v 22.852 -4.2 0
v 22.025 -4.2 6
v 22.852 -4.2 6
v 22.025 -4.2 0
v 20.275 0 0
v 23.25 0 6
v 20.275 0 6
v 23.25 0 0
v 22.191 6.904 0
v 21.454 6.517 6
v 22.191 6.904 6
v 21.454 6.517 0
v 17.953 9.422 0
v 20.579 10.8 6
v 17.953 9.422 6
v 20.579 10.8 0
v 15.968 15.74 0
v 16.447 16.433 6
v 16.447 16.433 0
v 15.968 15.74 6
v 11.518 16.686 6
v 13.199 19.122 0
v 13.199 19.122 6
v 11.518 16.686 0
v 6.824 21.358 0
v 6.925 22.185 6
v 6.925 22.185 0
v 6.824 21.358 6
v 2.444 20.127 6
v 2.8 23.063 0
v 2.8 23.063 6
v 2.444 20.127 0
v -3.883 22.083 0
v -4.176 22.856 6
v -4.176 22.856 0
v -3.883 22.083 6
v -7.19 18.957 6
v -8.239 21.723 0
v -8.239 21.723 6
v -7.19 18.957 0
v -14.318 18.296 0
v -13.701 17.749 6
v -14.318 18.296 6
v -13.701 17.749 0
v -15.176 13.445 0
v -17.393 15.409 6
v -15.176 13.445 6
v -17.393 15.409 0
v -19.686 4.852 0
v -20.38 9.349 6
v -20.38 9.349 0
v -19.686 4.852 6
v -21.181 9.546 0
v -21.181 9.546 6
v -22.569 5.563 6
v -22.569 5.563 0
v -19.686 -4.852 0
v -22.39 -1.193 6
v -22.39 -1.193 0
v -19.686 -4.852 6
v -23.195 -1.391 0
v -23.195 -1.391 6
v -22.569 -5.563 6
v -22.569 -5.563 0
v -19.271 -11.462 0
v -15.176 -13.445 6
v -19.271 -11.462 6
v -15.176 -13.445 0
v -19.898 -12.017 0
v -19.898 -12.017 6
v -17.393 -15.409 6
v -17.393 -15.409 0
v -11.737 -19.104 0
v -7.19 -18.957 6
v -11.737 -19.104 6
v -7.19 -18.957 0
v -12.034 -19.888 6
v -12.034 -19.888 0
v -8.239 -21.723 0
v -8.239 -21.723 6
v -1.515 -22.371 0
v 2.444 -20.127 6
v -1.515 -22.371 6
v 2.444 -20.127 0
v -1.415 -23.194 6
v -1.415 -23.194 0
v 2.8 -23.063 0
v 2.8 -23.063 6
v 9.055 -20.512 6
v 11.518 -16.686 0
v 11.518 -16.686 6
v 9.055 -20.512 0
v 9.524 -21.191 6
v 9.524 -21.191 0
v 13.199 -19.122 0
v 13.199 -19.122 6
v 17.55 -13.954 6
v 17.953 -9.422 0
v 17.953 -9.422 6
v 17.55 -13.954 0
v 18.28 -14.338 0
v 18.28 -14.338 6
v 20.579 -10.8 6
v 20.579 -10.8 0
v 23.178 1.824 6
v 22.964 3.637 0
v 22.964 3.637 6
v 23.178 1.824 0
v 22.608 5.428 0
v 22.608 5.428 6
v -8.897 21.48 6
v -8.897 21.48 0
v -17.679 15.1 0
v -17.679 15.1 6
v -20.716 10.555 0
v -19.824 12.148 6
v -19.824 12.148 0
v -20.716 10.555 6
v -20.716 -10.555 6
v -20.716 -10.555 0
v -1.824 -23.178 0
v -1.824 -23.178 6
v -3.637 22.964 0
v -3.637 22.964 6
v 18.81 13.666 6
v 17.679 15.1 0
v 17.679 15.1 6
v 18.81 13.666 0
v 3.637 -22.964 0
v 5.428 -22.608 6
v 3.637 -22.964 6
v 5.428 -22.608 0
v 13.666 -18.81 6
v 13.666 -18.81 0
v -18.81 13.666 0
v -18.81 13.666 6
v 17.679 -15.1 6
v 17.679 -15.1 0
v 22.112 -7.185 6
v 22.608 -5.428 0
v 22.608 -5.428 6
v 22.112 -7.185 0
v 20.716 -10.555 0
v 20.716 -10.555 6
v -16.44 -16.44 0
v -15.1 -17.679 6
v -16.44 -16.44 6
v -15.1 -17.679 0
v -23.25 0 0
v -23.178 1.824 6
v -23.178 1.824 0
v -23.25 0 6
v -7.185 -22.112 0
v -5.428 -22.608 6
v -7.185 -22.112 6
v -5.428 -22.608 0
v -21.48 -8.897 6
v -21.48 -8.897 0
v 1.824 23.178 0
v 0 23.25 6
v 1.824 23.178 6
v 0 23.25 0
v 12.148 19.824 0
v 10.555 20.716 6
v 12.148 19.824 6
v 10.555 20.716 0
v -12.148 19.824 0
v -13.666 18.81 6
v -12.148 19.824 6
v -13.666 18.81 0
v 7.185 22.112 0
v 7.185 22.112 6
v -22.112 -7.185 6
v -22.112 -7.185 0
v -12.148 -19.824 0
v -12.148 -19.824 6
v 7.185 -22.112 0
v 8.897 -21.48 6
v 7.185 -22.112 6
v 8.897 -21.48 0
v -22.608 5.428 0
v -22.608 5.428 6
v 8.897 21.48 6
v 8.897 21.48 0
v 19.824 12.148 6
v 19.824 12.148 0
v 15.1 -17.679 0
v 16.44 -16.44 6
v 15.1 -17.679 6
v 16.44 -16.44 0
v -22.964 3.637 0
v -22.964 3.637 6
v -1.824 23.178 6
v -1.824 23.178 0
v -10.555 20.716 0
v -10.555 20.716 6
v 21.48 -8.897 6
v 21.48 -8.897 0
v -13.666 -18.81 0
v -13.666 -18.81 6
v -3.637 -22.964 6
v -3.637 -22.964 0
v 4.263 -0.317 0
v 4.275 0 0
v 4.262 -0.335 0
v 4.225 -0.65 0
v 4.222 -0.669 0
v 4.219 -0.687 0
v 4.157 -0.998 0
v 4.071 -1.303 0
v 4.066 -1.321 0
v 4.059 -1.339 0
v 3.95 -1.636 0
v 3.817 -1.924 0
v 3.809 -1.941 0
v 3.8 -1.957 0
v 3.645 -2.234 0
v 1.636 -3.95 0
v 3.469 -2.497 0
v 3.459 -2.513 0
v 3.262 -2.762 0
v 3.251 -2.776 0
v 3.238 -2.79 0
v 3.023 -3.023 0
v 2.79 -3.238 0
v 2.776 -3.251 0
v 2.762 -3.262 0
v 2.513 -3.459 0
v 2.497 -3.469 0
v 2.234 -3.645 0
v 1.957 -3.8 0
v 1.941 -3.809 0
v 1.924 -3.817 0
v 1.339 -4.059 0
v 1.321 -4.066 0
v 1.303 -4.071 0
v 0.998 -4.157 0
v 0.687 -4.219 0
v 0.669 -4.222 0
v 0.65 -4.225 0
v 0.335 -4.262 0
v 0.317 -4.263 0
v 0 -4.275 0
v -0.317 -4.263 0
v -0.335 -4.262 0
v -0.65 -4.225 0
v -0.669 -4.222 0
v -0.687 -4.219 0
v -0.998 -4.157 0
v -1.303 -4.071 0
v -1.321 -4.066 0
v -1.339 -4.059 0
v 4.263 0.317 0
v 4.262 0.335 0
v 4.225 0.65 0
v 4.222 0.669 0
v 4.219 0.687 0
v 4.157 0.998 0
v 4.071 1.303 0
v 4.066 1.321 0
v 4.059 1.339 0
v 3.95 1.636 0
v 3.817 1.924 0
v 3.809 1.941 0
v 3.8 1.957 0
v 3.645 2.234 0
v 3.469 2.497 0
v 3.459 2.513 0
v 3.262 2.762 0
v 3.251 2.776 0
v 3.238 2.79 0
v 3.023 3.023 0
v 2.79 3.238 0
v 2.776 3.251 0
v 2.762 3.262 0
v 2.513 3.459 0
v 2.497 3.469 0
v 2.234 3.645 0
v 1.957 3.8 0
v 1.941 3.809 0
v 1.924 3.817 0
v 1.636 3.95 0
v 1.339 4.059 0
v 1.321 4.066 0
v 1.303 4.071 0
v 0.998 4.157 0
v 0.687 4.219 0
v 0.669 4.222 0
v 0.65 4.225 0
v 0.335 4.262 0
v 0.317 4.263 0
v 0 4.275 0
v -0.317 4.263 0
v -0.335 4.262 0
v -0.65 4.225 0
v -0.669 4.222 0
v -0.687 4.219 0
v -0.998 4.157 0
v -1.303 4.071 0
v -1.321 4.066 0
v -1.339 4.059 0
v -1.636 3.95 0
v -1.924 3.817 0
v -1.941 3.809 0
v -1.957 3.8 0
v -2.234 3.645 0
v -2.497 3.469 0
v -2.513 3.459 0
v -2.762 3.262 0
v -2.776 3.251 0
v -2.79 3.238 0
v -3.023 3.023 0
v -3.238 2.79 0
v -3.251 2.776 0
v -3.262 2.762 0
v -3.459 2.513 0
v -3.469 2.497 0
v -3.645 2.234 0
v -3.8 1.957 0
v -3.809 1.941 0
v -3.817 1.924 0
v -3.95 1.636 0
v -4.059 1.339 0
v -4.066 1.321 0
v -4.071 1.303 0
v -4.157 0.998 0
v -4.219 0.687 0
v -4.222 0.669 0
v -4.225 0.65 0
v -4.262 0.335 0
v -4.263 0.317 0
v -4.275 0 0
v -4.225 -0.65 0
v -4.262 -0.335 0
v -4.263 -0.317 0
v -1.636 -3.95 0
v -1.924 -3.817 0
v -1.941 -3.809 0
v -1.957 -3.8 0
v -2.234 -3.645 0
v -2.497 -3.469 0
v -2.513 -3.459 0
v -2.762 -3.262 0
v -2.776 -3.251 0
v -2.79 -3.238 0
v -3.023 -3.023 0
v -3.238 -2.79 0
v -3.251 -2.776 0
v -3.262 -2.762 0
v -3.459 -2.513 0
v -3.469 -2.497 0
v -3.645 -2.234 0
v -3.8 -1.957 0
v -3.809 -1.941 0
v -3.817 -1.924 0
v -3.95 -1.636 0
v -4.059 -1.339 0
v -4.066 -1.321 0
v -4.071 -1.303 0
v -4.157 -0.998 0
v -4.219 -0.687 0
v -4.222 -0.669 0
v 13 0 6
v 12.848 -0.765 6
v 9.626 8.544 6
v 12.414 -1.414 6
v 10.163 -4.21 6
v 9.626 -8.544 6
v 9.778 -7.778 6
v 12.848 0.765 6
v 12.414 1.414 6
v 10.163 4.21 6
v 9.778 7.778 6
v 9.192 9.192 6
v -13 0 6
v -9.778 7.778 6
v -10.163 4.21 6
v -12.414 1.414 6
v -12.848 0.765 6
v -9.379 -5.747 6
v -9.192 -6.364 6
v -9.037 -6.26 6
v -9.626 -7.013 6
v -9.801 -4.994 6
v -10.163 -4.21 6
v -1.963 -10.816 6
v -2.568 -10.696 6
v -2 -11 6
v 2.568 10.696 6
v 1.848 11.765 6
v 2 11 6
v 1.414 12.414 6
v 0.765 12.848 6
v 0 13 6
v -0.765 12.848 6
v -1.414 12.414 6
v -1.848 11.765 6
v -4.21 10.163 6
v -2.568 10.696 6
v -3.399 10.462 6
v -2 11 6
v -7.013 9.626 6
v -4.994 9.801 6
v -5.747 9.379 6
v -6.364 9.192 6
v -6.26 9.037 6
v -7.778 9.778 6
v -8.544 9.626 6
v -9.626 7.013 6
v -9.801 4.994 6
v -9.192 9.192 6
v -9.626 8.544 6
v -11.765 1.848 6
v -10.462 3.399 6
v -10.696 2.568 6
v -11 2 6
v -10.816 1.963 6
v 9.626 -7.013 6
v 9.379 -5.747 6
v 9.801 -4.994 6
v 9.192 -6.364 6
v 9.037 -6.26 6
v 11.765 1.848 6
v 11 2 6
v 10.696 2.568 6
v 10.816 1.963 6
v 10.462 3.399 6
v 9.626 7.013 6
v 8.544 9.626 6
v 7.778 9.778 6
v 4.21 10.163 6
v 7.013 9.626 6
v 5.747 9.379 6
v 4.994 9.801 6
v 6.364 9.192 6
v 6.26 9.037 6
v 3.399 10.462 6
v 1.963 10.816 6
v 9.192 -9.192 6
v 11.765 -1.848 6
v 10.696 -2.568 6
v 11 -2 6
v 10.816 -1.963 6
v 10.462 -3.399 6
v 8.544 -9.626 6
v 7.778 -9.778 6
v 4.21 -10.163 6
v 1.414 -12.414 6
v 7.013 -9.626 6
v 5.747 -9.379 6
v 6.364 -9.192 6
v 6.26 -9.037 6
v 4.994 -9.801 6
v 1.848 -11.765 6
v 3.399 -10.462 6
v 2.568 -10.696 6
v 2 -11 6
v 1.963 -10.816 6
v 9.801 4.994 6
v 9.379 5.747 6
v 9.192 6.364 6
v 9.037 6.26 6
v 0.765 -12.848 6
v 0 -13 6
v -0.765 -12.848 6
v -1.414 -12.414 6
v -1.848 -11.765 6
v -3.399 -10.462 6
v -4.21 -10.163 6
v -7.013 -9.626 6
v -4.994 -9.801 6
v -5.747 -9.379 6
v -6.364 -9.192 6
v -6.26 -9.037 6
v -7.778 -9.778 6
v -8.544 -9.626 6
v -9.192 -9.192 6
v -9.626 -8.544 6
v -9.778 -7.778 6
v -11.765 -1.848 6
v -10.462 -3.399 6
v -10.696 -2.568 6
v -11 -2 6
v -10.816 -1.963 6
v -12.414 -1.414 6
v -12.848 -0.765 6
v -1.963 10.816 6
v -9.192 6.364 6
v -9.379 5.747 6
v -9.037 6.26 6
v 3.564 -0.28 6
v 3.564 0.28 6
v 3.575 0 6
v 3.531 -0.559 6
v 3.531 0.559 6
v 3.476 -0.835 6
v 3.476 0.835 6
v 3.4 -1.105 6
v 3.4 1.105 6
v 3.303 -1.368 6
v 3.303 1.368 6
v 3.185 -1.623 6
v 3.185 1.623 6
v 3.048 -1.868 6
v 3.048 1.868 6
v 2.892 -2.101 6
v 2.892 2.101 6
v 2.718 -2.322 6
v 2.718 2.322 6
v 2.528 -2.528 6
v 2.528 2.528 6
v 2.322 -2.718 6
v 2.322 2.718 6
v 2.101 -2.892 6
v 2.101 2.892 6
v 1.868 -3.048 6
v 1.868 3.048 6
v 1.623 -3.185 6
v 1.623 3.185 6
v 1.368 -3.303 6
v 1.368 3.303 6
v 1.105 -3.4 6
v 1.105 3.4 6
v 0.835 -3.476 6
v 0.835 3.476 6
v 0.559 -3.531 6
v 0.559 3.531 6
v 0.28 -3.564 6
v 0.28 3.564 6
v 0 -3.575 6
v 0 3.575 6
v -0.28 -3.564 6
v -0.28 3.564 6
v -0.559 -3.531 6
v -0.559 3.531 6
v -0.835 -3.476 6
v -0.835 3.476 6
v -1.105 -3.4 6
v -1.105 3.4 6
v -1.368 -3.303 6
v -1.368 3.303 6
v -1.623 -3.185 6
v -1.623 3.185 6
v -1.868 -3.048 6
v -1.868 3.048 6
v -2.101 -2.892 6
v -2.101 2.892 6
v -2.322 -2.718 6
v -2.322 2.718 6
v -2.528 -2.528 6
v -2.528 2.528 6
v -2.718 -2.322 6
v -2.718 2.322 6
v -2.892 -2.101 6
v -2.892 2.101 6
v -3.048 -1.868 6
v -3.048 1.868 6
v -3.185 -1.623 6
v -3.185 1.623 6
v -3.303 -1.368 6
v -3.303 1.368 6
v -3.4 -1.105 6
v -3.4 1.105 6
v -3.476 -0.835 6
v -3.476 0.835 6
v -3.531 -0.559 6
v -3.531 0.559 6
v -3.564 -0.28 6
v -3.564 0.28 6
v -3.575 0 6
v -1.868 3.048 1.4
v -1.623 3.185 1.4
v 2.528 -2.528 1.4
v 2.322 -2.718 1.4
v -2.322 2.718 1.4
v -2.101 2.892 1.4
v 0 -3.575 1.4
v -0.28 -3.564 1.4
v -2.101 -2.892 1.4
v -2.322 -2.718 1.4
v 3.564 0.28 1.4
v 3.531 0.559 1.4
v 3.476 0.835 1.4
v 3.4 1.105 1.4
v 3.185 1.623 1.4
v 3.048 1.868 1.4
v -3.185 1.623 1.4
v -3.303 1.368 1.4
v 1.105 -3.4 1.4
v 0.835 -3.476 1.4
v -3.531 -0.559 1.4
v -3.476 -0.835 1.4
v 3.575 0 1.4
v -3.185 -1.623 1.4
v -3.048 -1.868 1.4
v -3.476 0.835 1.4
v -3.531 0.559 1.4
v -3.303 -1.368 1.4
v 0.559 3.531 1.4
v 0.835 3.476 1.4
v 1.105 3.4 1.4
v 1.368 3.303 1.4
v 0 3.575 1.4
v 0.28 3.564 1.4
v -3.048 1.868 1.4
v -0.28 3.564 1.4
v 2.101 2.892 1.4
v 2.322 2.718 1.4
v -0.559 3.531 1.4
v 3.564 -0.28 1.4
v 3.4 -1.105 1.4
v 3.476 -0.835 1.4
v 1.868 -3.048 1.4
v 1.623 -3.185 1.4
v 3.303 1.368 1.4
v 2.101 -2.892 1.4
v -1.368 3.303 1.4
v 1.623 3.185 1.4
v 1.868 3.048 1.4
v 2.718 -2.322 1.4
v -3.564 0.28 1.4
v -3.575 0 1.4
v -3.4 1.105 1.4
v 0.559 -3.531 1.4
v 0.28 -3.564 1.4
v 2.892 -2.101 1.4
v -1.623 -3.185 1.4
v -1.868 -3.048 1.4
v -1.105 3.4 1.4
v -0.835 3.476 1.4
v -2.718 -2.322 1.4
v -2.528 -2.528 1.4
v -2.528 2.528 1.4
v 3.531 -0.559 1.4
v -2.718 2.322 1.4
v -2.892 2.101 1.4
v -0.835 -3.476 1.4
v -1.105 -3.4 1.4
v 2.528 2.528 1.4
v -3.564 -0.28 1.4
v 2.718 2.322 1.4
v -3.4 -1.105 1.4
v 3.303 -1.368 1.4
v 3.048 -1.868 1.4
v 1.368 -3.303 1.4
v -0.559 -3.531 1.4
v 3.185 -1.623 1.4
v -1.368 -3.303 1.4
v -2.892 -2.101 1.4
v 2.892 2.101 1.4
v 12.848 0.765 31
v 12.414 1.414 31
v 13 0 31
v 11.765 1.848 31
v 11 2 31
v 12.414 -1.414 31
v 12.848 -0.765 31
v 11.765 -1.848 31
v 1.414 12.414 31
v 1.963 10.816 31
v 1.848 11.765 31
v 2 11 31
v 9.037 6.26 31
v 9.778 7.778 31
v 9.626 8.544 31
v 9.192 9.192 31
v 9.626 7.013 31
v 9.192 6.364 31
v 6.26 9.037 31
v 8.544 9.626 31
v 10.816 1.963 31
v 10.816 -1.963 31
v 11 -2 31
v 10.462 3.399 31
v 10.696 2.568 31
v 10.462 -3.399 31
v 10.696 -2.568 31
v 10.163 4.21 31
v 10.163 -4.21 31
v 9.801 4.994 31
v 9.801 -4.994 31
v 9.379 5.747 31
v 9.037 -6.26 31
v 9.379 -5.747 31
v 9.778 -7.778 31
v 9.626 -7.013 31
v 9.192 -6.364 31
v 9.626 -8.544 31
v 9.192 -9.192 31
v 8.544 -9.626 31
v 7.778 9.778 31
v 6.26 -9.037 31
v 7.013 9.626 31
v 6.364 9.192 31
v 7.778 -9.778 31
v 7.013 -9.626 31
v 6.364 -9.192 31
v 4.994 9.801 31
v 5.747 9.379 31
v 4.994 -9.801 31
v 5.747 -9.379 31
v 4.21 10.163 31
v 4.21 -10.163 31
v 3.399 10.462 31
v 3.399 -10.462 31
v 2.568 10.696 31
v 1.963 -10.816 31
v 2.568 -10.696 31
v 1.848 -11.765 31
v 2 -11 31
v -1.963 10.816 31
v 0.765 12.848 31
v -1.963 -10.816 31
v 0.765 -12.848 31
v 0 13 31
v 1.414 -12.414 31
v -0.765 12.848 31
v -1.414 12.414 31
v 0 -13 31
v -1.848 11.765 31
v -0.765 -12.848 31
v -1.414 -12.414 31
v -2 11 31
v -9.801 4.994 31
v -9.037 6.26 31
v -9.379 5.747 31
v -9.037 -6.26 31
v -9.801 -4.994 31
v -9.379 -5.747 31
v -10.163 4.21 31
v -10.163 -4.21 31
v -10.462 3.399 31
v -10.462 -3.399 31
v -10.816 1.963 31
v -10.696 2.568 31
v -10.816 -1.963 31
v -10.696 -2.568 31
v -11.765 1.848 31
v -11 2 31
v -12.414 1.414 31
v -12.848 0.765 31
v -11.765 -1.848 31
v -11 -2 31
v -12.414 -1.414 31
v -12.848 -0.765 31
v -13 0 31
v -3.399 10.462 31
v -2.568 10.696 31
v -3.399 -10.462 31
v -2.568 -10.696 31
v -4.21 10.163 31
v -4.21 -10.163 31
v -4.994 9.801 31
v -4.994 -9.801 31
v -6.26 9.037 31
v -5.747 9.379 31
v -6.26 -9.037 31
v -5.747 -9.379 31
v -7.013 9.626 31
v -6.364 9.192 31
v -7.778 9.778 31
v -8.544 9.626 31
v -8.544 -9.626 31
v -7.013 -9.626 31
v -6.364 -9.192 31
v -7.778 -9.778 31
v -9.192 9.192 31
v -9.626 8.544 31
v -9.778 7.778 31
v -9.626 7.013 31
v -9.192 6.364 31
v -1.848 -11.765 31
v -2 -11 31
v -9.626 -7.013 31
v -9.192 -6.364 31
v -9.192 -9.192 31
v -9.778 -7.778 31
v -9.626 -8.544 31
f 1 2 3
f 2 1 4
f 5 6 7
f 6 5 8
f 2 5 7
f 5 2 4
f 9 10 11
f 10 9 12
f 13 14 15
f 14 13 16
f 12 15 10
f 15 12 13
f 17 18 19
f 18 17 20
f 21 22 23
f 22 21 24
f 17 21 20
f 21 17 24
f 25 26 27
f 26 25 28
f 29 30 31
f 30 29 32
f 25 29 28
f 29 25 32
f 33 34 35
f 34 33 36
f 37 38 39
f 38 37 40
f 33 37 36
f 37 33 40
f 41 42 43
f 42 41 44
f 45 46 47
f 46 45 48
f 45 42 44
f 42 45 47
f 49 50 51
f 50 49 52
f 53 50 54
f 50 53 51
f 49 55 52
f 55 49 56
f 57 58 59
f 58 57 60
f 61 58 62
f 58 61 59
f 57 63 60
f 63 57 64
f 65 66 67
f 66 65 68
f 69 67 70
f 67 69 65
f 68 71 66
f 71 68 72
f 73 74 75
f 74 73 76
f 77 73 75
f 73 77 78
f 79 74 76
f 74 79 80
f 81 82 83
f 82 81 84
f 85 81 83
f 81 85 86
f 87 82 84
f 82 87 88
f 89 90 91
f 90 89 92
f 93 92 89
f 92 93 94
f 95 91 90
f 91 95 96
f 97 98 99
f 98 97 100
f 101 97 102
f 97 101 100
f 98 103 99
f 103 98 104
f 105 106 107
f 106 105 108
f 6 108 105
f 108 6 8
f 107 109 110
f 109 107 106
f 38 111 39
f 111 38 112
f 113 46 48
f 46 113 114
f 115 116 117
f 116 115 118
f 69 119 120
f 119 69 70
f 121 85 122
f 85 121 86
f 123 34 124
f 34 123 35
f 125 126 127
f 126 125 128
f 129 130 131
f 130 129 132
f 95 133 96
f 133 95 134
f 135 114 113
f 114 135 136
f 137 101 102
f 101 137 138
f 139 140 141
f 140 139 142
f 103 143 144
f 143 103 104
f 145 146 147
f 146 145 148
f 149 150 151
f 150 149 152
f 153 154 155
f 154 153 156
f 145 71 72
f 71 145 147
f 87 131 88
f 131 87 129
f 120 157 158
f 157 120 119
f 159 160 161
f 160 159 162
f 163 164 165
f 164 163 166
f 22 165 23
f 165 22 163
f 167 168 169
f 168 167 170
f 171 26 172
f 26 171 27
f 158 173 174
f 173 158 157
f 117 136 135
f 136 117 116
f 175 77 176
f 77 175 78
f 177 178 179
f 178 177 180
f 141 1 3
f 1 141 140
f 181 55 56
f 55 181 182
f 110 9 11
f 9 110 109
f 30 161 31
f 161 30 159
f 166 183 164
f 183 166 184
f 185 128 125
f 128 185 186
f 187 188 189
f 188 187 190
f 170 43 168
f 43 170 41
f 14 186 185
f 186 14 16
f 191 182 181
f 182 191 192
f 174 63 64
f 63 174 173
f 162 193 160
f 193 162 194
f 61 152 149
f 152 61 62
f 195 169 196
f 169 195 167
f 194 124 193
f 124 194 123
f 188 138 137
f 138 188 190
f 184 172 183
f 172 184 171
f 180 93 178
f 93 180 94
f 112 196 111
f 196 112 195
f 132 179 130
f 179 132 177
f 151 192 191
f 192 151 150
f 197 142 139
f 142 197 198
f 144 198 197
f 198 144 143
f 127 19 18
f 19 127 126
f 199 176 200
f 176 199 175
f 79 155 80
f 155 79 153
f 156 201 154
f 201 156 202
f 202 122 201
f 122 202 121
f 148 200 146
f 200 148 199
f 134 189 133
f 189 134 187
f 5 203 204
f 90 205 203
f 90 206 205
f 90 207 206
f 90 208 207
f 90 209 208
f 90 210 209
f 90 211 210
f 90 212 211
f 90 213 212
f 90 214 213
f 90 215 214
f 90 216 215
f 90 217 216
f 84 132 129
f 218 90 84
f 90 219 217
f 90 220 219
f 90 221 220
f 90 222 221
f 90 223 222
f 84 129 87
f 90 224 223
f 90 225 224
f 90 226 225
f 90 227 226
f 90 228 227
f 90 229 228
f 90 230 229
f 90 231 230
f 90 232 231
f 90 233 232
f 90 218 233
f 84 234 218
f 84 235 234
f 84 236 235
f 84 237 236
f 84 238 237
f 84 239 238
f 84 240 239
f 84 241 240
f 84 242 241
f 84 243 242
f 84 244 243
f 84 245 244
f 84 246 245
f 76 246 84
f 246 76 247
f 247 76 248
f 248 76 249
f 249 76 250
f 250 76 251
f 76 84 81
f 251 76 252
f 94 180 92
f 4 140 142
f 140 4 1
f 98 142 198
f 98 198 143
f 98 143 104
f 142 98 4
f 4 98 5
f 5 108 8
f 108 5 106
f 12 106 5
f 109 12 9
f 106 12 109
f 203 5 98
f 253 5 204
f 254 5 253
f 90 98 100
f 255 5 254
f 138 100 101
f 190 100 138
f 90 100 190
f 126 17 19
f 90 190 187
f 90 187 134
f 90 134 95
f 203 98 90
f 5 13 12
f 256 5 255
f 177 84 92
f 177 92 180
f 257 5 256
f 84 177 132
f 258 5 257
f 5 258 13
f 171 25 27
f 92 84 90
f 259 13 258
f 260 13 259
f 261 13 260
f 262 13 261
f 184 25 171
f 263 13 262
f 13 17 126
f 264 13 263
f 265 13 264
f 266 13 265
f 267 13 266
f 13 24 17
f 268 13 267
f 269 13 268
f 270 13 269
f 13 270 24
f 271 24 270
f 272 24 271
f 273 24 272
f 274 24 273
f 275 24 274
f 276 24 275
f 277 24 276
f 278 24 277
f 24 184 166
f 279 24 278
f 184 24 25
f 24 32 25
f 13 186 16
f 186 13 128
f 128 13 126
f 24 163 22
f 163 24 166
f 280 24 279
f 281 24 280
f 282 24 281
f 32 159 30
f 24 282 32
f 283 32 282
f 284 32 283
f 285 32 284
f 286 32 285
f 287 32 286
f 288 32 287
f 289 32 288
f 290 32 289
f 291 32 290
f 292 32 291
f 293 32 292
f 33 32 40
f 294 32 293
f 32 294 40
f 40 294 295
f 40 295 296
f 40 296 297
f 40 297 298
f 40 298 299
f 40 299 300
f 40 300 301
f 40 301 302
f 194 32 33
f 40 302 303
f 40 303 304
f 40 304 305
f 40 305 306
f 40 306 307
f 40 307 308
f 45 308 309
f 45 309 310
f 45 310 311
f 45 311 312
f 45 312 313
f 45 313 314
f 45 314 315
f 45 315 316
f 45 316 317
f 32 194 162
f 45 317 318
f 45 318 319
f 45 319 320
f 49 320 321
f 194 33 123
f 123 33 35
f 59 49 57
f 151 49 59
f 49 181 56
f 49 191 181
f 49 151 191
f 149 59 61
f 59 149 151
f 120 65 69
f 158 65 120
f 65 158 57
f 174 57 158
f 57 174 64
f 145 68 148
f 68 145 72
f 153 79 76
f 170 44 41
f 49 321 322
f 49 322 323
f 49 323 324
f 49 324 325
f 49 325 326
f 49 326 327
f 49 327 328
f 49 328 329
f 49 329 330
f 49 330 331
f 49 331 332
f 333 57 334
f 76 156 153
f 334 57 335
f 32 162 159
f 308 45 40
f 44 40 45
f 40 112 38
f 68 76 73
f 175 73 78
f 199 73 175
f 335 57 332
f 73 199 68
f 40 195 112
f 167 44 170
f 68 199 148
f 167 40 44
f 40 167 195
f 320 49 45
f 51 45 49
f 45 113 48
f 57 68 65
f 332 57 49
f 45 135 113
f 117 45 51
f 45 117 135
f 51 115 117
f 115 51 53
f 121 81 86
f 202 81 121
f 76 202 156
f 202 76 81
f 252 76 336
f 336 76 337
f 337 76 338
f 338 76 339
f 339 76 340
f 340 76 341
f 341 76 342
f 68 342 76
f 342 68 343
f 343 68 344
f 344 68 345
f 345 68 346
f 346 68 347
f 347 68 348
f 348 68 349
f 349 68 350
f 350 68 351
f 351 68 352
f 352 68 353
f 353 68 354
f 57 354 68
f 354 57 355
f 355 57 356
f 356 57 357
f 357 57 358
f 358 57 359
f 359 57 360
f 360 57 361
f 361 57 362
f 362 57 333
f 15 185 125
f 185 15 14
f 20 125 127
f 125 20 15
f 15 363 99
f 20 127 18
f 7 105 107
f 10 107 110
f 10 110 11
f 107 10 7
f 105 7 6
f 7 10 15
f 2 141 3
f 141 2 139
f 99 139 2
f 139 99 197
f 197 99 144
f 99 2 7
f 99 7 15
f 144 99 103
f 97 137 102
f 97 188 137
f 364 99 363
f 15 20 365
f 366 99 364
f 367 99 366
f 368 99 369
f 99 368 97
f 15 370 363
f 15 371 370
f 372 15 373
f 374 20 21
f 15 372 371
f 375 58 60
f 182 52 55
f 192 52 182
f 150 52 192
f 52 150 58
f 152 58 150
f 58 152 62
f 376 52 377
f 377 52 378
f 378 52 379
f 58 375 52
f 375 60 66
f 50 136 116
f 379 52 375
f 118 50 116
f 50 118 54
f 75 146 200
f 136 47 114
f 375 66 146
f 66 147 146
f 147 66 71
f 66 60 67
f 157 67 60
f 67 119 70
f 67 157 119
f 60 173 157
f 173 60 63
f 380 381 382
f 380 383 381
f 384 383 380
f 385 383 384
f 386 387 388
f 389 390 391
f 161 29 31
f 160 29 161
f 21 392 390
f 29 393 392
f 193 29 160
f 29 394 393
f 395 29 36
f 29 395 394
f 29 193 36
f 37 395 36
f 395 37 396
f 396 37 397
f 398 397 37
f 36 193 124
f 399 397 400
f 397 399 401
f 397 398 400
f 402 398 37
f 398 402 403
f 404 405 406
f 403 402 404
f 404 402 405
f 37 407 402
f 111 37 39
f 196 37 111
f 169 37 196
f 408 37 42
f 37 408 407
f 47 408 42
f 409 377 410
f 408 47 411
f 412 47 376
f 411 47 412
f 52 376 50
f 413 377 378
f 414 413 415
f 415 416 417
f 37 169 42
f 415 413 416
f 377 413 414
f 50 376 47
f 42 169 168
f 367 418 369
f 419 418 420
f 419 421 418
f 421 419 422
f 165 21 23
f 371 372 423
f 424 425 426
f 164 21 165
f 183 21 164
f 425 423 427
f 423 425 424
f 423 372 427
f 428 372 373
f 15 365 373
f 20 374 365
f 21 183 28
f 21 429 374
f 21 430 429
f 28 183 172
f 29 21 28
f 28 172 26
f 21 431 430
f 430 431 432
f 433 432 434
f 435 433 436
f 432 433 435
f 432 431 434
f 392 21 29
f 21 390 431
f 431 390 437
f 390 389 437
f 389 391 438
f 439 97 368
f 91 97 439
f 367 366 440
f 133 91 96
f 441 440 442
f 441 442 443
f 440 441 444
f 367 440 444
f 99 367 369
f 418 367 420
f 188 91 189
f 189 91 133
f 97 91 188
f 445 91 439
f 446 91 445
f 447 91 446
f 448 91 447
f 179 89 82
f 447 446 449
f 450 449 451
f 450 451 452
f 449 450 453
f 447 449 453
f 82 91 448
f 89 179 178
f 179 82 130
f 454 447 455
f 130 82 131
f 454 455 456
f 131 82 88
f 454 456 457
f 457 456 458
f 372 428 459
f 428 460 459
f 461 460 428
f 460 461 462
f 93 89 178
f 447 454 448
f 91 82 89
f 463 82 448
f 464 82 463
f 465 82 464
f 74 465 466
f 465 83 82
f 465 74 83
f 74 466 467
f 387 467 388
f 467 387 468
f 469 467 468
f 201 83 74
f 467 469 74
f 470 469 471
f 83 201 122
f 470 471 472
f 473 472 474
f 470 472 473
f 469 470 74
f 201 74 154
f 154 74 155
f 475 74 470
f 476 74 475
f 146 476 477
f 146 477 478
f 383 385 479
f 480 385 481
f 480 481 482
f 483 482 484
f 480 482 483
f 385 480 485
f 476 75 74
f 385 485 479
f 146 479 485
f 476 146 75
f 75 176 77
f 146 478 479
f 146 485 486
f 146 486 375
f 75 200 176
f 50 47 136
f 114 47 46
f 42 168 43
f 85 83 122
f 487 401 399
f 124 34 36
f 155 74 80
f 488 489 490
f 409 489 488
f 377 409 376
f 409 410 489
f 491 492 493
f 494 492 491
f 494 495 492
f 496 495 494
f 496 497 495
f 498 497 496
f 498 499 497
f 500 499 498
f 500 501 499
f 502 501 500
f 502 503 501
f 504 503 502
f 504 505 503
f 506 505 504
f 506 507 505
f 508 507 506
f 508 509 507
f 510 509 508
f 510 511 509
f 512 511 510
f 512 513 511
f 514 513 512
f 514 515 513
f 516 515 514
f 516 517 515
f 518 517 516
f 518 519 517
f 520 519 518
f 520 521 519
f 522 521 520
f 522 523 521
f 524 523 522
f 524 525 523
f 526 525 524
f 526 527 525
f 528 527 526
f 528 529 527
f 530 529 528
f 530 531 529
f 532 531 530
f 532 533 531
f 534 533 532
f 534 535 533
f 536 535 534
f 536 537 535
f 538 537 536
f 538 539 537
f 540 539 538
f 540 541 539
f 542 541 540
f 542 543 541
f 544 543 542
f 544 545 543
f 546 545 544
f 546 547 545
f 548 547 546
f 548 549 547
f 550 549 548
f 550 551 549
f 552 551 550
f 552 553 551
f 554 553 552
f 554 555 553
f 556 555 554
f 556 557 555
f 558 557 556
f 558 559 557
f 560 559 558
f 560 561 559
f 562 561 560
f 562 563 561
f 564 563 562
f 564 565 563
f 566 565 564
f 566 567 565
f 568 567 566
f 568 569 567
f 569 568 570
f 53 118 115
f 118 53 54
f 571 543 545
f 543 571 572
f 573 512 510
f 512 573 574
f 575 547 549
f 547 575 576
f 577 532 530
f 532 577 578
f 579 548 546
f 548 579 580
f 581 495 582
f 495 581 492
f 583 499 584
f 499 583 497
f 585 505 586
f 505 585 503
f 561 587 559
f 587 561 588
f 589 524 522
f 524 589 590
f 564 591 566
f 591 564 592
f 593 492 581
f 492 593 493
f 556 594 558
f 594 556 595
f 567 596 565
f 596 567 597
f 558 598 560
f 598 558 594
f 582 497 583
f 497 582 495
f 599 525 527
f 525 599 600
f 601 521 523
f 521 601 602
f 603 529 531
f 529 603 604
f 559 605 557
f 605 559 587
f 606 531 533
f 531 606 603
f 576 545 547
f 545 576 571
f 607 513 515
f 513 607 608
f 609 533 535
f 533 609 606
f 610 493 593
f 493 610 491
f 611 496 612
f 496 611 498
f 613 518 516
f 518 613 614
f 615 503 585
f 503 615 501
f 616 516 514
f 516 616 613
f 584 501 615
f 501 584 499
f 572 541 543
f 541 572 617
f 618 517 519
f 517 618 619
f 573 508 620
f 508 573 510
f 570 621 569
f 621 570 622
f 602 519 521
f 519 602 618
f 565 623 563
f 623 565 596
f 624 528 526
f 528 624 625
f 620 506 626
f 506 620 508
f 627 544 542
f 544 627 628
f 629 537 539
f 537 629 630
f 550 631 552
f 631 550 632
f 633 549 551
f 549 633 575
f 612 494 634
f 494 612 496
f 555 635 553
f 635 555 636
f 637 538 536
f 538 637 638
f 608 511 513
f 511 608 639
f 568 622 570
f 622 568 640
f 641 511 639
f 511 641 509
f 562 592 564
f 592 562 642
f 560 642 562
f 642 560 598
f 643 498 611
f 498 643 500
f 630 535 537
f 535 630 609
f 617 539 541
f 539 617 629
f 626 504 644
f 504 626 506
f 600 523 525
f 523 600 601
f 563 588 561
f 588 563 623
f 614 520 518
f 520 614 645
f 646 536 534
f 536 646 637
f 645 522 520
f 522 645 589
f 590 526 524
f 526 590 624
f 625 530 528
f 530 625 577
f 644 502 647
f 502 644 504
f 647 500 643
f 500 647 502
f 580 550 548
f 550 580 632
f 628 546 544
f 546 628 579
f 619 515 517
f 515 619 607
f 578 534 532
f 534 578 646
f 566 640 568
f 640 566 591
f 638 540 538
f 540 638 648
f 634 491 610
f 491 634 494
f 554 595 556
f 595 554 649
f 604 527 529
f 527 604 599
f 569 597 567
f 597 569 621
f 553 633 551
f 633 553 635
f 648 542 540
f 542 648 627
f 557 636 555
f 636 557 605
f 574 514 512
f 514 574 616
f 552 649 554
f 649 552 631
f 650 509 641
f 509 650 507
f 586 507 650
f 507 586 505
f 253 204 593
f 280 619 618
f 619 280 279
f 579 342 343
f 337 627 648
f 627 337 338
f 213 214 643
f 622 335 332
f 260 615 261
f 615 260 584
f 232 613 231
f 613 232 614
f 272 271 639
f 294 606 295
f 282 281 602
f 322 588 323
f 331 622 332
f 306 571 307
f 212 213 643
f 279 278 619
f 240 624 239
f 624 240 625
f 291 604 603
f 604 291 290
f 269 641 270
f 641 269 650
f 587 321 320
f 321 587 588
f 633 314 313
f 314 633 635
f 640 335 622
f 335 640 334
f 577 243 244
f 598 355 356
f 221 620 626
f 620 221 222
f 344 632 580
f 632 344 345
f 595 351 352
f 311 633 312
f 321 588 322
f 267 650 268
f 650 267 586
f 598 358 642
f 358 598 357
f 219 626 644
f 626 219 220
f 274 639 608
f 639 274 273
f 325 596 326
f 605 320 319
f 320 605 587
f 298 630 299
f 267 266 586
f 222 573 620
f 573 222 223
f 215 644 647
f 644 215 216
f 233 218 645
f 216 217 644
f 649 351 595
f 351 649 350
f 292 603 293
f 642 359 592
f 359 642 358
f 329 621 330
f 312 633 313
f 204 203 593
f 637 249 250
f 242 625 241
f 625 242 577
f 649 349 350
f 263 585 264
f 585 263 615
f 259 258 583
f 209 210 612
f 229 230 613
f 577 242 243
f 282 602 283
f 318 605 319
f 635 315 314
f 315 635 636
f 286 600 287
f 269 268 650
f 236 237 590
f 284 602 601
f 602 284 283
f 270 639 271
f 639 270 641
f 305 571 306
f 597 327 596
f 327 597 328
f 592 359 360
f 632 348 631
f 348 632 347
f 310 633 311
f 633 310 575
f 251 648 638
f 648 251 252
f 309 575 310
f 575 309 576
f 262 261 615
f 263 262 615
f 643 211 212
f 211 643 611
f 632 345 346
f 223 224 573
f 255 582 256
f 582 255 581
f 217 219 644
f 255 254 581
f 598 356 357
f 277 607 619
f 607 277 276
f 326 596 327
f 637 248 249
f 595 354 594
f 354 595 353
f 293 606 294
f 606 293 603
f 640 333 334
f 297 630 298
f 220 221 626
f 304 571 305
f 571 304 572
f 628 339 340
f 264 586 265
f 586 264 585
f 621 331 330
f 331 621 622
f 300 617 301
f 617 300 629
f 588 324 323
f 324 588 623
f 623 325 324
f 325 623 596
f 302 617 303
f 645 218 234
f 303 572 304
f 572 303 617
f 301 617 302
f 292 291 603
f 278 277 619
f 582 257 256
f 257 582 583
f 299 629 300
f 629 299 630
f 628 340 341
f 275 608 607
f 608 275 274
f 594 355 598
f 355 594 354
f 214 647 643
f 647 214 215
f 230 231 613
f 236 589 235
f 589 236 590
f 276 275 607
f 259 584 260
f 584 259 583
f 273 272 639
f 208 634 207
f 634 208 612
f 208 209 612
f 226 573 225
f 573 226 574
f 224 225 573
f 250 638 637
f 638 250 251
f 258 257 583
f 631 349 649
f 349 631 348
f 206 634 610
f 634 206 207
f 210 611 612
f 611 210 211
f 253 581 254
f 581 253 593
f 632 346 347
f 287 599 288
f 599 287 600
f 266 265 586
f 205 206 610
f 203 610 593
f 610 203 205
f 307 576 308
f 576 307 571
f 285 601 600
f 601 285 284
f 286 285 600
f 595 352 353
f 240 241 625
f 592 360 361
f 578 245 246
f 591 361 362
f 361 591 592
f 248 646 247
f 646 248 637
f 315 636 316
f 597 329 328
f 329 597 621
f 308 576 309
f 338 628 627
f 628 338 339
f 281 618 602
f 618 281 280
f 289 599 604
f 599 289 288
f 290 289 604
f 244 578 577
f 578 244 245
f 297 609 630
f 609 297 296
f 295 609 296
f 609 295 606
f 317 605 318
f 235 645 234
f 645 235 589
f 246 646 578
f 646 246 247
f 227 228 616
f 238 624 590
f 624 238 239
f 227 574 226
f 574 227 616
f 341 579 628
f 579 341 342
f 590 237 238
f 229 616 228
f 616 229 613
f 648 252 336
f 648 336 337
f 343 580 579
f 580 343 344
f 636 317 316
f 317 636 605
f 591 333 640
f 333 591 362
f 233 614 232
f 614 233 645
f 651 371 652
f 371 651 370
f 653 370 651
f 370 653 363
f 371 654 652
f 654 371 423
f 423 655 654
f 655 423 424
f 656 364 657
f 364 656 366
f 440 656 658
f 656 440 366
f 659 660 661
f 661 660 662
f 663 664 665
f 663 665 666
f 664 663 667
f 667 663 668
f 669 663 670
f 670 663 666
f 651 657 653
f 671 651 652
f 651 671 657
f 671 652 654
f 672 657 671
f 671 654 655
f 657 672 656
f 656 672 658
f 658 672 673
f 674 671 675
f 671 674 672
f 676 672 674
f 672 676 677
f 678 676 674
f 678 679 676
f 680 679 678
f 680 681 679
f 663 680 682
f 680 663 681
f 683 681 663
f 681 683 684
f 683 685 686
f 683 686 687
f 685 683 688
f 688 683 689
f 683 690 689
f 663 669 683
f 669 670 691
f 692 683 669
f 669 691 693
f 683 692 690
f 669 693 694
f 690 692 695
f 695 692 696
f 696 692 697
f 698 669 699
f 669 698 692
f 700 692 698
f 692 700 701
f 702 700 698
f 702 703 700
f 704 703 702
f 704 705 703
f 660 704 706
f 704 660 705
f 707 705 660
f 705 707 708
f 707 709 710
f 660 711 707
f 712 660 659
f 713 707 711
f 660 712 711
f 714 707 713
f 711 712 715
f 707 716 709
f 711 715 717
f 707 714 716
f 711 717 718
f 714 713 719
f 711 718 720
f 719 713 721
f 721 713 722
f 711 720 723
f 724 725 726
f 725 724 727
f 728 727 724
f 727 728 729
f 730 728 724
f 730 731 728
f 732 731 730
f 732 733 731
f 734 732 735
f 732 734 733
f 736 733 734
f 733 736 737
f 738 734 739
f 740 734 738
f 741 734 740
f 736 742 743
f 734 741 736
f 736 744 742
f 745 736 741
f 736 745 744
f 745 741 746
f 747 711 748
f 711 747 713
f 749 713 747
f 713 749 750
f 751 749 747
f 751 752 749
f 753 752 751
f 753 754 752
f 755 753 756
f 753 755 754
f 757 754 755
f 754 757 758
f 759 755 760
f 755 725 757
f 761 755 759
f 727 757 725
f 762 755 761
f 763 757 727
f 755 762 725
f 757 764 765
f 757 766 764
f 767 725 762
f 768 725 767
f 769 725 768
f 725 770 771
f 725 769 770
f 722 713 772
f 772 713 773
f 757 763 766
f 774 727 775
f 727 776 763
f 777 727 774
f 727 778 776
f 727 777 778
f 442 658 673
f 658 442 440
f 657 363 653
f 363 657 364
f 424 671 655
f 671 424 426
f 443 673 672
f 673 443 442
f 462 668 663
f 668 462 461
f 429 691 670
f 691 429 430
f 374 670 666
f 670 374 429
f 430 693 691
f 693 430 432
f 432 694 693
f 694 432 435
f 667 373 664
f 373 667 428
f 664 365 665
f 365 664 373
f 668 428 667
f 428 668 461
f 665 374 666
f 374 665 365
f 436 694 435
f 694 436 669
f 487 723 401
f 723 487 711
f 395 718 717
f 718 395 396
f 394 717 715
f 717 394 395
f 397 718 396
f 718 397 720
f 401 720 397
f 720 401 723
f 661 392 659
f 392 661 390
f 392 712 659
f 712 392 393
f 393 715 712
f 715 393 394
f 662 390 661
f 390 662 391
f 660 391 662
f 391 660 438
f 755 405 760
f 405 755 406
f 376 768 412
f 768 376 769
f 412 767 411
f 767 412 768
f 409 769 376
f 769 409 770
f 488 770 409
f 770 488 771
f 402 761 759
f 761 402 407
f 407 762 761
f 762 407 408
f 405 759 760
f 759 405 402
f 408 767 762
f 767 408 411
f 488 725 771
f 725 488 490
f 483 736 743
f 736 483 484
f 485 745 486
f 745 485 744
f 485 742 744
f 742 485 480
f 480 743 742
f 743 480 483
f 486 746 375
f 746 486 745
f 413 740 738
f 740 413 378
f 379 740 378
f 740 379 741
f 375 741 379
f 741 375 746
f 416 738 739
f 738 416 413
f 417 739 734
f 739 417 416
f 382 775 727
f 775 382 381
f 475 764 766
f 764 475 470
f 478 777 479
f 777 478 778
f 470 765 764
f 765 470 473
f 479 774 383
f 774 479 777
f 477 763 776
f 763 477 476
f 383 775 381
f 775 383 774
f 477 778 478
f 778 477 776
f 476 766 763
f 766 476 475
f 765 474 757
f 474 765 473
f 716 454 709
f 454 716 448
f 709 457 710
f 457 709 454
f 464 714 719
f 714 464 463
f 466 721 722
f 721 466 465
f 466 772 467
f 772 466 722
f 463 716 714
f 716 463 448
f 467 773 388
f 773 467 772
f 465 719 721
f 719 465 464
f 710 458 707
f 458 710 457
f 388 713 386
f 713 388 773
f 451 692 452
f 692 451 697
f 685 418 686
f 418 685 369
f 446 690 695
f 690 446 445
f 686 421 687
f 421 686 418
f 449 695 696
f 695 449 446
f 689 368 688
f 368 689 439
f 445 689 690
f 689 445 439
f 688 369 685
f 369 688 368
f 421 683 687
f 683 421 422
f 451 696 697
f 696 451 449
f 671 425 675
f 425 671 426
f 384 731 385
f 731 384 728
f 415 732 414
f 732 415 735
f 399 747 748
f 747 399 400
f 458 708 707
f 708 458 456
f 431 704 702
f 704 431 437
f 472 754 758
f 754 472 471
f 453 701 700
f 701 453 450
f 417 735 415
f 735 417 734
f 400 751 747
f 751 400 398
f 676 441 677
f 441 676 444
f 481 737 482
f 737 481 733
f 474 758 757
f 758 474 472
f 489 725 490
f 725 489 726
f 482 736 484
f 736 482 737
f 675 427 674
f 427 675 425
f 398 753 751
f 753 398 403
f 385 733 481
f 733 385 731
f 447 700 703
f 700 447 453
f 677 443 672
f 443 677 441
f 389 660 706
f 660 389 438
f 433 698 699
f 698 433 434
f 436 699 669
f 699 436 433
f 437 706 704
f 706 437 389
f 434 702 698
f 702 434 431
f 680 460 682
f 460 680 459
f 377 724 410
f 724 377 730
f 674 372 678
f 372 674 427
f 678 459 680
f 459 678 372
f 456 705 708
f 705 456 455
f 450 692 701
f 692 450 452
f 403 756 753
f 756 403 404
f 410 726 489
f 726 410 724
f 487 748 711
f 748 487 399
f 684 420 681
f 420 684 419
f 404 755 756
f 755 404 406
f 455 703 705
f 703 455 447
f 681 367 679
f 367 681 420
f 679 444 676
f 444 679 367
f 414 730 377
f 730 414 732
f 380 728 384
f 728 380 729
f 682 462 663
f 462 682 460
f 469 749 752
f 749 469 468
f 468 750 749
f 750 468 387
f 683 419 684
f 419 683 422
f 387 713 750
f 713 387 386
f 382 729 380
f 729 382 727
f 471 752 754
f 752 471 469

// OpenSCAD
// --- Oblong Geared Spice Rack (Final V5 - 13T Knob) ---
// Plate Size: 256x256mm
// Fixes: 13-tooth Knob, Flush Axles, Safe Print Layout
// UPDATE (2025-12-29):
//  - FIX: Both trays rotate together (same direction) when knob turns.
//  - FIX: Mesh uses overlap engagement (needed for this cut-tooth gear style).

/* [View Mode] */
// Uncheck to see the printable parts layout
show_animation = false;

part_to_print = "knob";

/* [General Dimensions] */
gear_module = 3.5;

tray_teeth_count = 30;
knob_teeth_count = 13;

knob_pd_adjust = 1.0;  // mm to enlarge knob gear pitch diameter (try 0.8–1.6)


// Auto-calculate exact Pitch Diameters
tray_pd = tray_teeth_count * gear_module; // 105mm
knob_pd = (knob_teeth_count * gear_module) + knob_pd_adjust;


tray_wall_height = 15;
base_height = 4;
tolerance = 0.15;

/* [Mesh Tuning] */
// IMPORTANT for this gear style: gears are "notch-cut" from a pitch cylinder,
// so they usually need a tiny OVERLAP to actually interlock.
// Positive = tighter / more engagement. Start 0.15 to 0.25.
mesh_overlap = 0.25;

/* [Hidden] */
$fn = 80;

// Spacing between the two large trays
gear_spacing = tray_pd + 1.0;

// Placement Math
dist_x = gear_spacing / 2;
dist_target = (tray_pd/2) + (knob_pd/2);

// For engagement, reduce the center distance slightly:
mesh_radius = dist_target - mesh_overlap;

// Safe sqrt guard (prevents NaN if values are impossible)
calc_y_offset = -sqrt(max(mesh_radius*mesh_radius - dist_x*dist_x, 0));

// --- Main Logic ---
// --- Main Logic ---
if (part_to_print == "knob") {
    // Print knob by itself at the origin
    drive_knob();
}
else if (show_animation) {
    assembly_animated();
}
else {
    print_layout_bambu_vertical();
}


// --- Layouts ---

module print_layout_bambu_vertical() {
    // 1. Base Housing (Left Side)
    translate([-68, 0, 0])
    rotate([0,0,90])
    base_housing();

    // 2. Tray 1 (Top Right)
    translate([68, 70, 0])
    spice_turntable();

    // 3. Tray 2 (Bottom Right)
    translate([68, -70, 0])
    spice_turntable();

    // 4. Drive Knob (Center Right)
    // Positioned safely at X=38
    translate([38, 0, 0])
    drive_knob();
}

module assembly_animated() {
    knob_turns_per_cycle = 4;
    total_base_rotation = 360 * $t * knob_turns_per_cycle;

    // gear ratio: tray angle = knob angle * (knob_teeth / tray_teeth)
    ratio_knob_to_tray = knob_teeth_count / tray_teeth_count;

    // Knob rotation (sign just affects visual direction)
    knob_angle = -total_base_rotation;

    // With a center knob meshing both trays:
    // - Each tray rotates opposite the knob
    // - Both trays rotate the SAME direction as each other
    tray_angle = (total_base_rotation * ratio_knob_to_tray);

    // Optional: small phase offset on ONE tray
    left_tray_angle  = tray_angle + (180/tray_teeth_count); // 1/2 tooth (6° for 30T)
    right_tray_angle = tray_angle;

    color("White") base_housing();

    color("#44aaff")
    translate([-gear_spacing/2, 0, base_height])
    rotate([0,0, left_tray_angle])
    spice_turntable();

    color("#66cc44")
    translate([gear_spacing/2, 0, base_height])
    rotate([0,0, right_tray_angle])
    spice_turntable();

    color("#ff4444")
    translate([0, calc_y_offset, base_height])
    rotate([0,0, knob_angle])
    drive_knob();
}

// --- Components ---

module base_housing() {
    union() {
        hull() {
            translate([-gear_spacing/2, 0, 0]) cylinder(h=base_height, d=tray_pd + 12);
            translate([gear_spacing/2, 0, 0]) cylinder(h=base_height, d=tray_pd + 12);
            translate([0, calc_y_offset, 0])  cylinder(h=base_height, d=knob_pd + 12);
        }

        // Reduced axle height to sit flush-ish with gear recess
        translate([-gear_spacing/2, 0, 0]) cylinder(h=base_height + 5.5, d=9 - tolerance);
        translate([gear_spacing/2, 0, 0]) cylinder(h=base_height + 5.5, d=9 - tolerance);
        translate([0, calc_y_offset, 0])  cylinder(h=base_height + 5.5, d=7 - tolerance);
    }
}

module spice_turntable() {
    union() {
        simple_gear(tray_teeth_count, tray_pd, 6, 9);
        translate([0,0,6]) {
            difference() {
                cylinder(h=tray_wall_height, d=tray_pd);
                translate([0,0,2]) cylinder(h=tray_wall_height, d=tray_pd - 4);
            }
            cylinder(h=2, d=tray_pd);
        }
    }
}

module drive_knob() {
    union() {
        simple_gear(knob_teeth_count, knob_pd, 6, 7);
        translate([0,0,6]) cylinder(h=25, d=22);
        translate([0,0,6])
        for(i=[0:45:360]) rotate([0,0,i]) translate([11,0,0]) cylinder(h=25, d=4, $fn=16);
    }
}

module simple_gear(num_teeth, pitch_d, height, axle_d) {
    pitch = 360 / num_teeth;
    tooth_depth = gear_module * 1.2;

    difference() {
        cylinder(h=height, d=pitch_d);

        // Axle Hole
        translate([0,0,-1]) cylinder(h=height+2, d=axle_d + tolerance);

        // Chamfer
        translate([0,0,-0.1]) cylinder(h=1.5, d1=axle_d + tolerance + 1.5, d2=axle_d + tolerance);

        for (i = [0 : num_teeth-1]) {
            rotate([0, 0, i * pitch])
            translate([pitch_d/2, 0, -1])
            linear_extrude(height+2)
            // Slimmer tooth profile (0.85 width factor) to prevent jamming
            polygon(points=[
                [-gear_module * 0.85, 0],
                [ gear_module * 0.85, 0],
                [ gear_module * 0.35, -tooth_depth],
                [-gear_module * 0.35, -tooth_depth]
            ]);
        }
    }
}
